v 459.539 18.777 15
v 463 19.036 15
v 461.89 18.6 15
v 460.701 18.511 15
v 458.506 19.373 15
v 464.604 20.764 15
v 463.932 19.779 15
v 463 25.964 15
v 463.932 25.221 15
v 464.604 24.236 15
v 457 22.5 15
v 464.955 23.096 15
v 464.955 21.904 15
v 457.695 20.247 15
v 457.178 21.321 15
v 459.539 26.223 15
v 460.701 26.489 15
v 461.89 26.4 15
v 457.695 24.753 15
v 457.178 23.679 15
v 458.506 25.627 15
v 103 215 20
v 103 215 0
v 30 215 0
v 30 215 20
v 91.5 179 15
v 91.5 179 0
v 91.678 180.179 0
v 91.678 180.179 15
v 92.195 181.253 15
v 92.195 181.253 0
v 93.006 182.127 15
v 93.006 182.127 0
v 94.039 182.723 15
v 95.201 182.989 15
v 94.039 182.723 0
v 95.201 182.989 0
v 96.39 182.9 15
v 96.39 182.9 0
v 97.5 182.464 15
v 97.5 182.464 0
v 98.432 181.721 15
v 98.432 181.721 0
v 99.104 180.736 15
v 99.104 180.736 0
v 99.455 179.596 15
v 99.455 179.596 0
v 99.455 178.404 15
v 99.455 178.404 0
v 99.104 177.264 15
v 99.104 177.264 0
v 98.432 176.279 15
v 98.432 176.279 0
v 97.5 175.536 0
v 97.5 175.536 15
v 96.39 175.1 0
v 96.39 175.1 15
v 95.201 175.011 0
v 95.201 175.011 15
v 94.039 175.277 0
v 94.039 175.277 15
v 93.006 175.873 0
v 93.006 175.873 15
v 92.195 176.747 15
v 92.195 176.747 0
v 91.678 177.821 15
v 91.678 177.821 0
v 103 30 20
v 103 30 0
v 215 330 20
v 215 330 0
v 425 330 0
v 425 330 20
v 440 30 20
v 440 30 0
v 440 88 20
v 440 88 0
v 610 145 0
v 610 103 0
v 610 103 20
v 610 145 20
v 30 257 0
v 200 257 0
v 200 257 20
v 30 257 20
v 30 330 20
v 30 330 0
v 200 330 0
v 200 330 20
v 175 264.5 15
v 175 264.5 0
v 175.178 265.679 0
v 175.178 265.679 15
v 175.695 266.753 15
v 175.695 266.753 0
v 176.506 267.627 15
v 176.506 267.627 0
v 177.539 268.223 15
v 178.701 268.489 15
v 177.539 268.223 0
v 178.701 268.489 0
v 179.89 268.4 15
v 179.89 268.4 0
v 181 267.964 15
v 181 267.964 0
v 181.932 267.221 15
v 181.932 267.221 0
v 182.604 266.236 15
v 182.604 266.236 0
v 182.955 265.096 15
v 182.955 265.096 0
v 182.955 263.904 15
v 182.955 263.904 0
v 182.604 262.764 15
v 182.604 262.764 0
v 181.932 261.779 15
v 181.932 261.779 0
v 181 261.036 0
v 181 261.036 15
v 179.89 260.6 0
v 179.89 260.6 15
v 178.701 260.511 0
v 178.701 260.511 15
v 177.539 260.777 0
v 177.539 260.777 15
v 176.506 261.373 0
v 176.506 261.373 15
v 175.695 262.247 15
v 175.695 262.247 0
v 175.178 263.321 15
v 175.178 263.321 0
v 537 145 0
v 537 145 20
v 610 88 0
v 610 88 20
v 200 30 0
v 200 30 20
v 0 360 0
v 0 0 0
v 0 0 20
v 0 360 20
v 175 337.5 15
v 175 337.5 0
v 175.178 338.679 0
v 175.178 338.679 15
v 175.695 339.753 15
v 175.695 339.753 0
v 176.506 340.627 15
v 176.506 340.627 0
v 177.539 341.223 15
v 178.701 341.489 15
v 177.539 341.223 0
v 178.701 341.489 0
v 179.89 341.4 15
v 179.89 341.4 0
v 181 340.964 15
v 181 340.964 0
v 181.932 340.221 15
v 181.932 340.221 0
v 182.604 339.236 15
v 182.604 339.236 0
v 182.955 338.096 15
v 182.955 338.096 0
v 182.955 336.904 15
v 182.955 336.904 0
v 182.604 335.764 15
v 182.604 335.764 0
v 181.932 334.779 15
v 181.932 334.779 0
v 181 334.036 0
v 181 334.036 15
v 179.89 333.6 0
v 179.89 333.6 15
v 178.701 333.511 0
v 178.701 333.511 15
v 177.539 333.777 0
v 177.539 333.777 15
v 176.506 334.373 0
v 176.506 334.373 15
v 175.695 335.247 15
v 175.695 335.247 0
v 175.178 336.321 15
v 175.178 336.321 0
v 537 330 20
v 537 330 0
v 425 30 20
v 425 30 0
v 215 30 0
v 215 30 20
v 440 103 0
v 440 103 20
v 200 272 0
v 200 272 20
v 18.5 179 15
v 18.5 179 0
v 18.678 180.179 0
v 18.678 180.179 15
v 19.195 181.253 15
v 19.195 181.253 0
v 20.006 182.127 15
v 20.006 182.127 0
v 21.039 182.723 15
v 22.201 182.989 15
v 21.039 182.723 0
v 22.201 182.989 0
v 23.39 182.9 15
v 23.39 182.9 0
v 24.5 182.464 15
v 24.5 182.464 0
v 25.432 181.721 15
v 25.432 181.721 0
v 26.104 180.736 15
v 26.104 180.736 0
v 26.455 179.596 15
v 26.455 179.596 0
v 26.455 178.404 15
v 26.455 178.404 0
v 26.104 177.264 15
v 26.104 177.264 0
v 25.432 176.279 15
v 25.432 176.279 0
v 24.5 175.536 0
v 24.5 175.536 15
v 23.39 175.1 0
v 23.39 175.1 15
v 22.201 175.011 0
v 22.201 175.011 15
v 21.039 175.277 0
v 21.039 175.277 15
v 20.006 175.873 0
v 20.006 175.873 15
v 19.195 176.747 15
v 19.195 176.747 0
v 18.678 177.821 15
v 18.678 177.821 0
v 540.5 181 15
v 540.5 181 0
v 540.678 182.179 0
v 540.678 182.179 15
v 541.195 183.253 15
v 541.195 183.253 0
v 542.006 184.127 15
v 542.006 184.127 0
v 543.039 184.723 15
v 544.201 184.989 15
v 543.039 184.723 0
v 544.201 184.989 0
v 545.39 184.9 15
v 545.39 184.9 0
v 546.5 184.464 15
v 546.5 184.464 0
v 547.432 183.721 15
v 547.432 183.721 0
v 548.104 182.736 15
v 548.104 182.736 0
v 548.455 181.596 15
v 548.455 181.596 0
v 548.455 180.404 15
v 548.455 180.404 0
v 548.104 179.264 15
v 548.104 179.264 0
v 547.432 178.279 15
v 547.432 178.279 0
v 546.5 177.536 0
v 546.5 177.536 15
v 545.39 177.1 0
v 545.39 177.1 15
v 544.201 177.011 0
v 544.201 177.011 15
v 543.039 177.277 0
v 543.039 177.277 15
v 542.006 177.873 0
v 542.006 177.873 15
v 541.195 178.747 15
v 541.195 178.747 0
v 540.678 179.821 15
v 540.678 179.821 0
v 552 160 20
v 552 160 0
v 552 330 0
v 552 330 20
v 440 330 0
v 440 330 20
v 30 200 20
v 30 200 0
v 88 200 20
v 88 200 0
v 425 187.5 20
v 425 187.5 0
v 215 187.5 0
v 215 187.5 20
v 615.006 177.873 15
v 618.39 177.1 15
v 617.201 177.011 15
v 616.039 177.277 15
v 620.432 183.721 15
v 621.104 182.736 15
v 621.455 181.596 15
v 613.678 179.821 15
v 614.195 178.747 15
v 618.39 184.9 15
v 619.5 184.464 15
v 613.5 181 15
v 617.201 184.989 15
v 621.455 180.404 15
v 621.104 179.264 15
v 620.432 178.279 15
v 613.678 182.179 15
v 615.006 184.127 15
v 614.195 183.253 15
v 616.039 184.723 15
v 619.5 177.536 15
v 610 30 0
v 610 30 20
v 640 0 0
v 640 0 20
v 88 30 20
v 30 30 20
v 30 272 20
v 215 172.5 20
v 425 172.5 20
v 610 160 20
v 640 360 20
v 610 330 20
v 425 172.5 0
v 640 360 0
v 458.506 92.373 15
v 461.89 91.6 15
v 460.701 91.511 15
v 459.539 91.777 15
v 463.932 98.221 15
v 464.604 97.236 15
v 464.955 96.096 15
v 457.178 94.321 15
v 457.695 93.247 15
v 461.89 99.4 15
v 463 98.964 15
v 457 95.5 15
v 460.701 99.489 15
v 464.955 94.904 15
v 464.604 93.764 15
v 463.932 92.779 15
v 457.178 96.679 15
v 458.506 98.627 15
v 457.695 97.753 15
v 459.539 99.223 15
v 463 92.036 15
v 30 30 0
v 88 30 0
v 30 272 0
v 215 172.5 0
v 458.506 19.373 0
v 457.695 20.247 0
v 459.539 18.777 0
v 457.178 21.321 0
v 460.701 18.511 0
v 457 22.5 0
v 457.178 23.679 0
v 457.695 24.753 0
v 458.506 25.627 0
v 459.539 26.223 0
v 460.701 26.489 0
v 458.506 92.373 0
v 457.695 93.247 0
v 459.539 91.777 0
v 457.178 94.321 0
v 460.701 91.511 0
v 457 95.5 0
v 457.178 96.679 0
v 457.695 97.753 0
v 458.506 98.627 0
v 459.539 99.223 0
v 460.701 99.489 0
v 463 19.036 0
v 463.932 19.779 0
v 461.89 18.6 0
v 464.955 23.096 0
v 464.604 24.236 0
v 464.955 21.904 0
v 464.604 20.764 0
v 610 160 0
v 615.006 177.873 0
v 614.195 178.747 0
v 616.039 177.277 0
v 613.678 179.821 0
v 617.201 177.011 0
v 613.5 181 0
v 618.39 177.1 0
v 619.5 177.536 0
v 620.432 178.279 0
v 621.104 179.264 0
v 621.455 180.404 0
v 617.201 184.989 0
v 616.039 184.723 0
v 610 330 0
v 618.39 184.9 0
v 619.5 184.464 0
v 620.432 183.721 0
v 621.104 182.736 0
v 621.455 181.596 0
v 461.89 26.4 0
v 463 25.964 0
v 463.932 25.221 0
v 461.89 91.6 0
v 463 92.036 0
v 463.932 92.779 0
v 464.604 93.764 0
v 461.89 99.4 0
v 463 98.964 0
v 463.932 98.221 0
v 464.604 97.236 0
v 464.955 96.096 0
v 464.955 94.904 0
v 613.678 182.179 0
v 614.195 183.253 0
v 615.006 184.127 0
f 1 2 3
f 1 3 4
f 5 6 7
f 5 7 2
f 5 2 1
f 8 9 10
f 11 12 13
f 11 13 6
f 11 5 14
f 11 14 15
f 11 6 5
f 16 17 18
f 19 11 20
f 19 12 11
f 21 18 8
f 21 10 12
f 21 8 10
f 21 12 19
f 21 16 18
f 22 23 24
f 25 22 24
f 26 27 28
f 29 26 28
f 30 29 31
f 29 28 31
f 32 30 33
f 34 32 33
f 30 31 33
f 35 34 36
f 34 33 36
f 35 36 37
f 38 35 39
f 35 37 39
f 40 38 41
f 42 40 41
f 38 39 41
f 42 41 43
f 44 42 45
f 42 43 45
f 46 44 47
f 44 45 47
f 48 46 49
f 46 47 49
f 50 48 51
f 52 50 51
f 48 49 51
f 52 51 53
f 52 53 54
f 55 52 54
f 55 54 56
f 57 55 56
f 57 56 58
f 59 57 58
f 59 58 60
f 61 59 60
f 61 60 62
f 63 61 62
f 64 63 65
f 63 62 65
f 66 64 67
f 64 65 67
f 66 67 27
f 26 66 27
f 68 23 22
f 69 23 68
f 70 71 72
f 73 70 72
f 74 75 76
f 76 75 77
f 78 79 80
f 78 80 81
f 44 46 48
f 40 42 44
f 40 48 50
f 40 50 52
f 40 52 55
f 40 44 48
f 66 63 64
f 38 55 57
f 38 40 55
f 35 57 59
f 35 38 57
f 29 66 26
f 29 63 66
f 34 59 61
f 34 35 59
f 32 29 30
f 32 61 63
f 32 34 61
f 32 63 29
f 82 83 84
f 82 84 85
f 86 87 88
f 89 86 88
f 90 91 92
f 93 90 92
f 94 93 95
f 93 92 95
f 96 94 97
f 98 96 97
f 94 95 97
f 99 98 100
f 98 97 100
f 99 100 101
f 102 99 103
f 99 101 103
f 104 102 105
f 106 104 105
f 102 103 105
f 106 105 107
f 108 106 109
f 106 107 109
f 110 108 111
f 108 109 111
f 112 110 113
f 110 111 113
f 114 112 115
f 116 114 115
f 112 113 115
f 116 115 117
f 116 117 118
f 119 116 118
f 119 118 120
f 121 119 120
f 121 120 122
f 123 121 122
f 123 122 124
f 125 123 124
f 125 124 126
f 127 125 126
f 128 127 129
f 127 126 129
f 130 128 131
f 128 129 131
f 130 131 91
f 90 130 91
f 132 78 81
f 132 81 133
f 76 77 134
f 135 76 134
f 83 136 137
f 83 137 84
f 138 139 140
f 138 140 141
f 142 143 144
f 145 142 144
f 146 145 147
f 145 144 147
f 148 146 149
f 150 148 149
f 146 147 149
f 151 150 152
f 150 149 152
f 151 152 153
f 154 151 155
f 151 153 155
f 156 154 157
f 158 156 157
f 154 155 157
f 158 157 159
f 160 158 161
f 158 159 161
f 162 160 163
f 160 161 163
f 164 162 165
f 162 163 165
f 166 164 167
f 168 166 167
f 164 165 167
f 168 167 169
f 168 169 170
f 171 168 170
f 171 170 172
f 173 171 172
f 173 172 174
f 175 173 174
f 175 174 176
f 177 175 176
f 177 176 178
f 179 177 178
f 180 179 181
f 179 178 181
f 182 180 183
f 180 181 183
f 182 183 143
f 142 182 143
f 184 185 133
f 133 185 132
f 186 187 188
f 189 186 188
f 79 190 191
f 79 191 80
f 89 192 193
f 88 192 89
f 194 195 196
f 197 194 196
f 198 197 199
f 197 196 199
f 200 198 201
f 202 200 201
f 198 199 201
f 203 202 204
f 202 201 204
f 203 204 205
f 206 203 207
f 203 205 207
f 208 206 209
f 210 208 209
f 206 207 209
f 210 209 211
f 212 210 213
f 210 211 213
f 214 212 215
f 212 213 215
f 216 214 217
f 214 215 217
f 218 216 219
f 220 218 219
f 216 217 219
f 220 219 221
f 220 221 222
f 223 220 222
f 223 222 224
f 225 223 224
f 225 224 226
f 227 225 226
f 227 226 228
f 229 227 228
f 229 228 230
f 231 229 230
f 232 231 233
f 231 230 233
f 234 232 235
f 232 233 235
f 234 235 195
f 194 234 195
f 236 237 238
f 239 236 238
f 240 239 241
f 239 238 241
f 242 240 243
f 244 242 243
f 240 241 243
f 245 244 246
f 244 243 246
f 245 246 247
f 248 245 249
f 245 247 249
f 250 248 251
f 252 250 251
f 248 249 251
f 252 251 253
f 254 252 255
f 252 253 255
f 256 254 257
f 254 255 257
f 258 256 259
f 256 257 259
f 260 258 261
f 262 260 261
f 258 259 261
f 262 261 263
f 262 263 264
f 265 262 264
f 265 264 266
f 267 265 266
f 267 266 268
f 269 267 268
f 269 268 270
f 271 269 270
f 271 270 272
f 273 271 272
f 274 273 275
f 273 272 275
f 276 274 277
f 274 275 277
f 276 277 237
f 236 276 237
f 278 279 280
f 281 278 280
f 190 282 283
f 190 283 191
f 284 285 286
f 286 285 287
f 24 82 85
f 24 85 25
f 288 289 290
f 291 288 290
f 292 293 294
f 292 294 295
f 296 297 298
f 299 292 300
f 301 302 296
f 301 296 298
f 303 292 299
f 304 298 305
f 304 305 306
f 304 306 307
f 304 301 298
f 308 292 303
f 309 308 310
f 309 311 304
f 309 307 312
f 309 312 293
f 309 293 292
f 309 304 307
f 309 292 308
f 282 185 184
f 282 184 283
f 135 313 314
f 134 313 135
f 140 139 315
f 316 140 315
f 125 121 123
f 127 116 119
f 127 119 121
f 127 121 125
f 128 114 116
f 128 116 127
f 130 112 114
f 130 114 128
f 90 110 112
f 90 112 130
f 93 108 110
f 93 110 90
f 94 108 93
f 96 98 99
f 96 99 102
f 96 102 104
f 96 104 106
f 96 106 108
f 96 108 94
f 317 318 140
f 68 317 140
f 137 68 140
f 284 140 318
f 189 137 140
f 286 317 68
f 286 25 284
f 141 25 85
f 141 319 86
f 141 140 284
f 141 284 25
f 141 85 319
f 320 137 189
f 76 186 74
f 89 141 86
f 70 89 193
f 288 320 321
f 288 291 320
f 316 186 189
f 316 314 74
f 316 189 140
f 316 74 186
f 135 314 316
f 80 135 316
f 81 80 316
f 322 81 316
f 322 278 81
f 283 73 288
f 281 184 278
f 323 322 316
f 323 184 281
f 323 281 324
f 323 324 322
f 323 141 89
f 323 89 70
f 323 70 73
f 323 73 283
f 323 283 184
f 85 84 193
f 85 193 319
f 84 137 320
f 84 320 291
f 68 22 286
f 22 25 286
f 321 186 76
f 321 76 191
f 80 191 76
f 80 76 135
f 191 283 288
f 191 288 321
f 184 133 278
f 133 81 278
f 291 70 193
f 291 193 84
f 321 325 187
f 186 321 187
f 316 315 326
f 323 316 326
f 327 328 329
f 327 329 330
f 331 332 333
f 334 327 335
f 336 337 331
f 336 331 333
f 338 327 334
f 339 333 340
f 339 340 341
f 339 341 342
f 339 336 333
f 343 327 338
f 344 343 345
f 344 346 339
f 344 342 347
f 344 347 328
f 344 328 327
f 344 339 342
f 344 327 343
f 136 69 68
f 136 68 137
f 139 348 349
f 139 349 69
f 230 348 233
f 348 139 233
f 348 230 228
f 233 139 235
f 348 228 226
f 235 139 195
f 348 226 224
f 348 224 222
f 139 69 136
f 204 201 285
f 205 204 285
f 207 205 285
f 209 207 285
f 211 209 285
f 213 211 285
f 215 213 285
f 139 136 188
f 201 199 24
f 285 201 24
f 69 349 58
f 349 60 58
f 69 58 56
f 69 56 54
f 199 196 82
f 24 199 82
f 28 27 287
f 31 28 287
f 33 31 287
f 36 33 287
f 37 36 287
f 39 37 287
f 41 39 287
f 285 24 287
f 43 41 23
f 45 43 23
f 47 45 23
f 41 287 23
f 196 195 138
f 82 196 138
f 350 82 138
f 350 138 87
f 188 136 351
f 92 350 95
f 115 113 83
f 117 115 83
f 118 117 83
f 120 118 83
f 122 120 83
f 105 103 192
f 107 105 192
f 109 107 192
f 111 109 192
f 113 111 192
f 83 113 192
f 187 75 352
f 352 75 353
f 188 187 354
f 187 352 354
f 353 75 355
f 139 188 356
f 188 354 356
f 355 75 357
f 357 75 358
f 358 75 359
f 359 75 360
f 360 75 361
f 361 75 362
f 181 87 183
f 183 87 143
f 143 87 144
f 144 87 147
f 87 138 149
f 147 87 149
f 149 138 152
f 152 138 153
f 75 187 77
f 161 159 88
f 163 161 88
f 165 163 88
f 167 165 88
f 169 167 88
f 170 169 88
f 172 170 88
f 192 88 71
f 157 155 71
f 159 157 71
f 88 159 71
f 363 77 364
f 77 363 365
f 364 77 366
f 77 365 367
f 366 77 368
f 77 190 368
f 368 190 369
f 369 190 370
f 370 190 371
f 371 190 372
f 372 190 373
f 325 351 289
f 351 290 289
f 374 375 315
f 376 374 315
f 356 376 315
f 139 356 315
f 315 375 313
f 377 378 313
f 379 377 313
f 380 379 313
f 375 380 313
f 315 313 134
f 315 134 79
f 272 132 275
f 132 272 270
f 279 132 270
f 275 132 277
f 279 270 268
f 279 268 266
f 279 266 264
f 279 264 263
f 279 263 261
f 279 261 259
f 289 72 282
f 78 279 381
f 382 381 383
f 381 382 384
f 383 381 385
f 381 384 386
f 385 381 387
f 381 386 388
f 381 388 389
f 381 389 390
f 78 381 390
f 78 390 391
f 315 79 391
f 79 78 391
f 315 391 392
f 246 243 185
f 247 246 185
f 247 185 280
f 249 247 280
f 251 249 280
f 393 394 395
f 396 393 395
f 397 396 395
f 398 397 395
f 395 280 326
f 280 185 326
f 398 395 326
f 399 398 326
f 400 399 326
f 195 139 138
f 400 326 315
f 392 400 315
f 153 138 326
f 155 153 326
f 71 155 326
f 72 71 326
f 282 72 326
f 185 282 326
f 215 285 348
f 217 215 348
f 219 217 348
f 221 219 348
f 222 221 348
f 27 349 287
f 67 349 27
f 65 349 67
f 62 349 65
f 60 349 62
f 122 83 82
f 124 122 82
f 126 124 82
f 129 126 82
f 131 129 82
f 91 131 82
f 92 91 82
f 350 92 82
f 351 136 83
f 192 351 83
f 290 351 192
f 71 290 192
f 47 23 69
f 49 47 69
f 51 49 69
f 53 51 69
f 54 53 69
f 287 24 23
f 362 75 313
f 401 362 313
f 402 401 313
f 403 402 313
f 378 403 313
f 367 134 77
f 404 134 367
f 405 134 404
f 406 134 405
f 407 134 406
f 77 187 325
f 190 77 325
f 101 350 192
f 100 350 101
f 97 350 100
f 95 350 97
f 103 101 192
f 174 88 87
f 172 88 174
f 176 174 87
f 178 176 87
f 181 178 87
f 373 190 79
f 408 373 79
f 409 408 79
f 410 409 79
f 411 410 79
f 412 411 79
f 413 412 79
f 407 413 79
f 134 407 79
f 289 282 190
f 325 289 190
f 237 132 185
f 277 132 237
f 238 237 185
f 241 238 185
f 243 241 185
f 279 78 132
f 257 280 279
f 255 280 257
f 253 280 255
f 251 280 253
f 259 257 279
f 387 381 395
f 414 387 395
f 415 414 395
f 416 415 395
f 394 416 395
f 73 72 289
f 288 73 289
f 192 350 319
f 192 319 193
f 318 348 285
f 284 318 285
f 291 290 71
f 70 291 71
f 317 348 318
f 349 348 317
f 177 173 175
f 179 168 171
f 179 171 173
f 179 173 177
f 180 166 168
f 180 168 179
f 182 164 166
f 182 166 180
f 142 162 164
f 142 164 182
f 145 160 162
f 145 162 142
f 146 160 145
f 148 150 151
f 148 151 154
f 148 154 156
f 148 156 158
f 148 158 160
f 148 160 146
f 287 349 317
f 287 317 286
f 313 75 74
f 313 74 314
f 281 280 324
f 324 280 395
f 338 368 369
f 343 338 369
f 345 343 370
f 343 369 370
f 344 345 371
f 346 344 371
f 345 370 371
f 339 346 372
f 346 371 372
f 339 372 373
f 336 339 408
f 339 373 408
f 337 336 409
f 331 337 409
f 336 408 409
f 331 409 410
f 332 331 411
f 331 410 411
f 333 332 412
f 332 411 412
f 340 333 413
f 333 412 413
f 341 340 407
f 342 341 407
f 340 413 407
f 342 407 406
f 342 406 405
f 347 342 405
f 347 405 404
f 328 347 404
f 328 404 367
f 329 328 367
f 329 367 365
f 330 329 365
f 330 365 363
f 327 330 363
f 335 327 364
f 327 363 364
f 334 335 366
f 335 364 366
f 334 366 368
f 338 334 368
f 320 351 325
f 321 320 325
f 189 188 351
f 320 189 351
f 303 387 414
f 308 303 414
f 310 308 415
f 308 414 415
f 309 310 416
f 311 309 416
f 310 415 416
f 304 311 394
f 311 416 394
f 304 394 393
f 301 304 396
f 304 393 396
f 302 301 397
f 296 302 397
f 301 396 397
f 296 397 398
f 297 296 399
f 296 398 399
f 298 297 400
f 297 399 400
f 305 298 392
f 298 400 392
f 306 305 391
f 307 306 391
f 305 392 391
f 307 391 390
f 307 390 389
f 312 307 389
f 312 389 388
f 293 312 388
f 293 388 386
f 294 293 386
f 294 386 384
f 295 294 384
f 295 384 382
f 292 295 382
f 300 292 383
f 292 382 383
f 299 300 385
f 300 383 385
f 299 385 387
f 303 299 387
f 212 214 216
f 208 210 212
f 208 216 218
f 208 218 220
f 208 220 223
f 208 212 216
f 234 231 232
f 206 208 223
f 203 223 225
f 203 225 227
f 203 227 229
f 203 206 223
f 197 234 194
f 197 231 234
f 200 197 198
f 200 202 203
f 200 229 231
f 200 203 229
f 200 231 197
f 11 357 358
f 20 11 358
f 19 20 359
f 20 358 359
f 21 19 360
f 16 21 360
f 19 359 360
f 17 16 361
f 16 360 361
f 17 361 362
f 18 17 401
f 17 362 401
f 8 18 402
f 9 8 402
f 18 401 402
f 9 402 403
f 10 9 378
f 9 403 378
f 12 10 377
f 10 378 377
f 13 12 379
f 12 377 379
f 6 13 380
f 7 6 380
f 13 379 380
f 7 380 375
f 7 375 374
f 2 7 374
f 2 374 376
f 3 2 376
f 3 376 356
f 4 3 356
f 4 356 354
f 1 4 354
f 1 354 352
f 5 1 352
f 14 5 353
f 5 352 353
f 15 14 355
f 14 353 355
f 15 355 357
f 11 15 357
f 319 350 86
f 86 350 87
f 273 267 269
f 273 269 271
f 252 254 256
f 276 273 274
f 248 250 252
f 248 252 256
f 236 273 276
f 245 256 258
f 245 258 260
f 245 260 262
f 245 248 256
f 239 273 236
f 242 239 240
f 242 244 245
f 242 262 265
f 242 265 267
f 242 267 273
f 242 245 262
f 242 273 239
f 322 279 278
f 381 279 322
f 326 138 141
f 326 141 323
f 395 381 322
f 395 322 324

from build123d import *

# Parameters (mm, degrees)
ESBO_O1_W                = 640
ESBO_O1_H                = 360
ESBO_O1_W_2              = 170
ESBO_O1_H_2              = 58
ESBO_O1_W_3              = 58
ESBO_O1_H_3              = 170
RESSALTO_EXTRUS_O1_DEPTH = 20
ESBO_O2_R                = 4
CORTE_EXTRUS_O1_DEPTH    = 15


with BuildPart() as part:
    # Esboço1 → Ressalto-extrusão1 (new body)
    with BuildSketch(Plane.XY):
        with Locations((320, 180)):
            Rectangle(ESBO_O1_W, ESBO_O1_H)
        Polygon((215, 330), (425, 330), (425, 187.5), (215, 187.5), (215, 257), align=None, mode=Mode.SUBTRACT)
        with Locations((115, 301)):
            Rectangle(ESBO_O1_W_2, ESBO_O1_H_2, mode=Mode.SUBTRACT)
        with Locations((59, 115)):
            Rectangle(ESBO_O1_W_3, ESBO_O1_H_3, mode=Mode.SUBTRACT)
        with Locations((581, 245)):
            Rectangle(ESBO_O1_W_3, ESBO_O1_H_3, mode=Mode.SUBTRACT)
        Polygon((200, 257), (30, 257), (30, 215), (88, 215), (103, 215), (103, 30), (200, 30), align=None, mode=Mode.SUBTRACT)
        Polygon((425, 88), (425, 30), (215, 30), (215, 172.5), (425, 172.5), (425, 103), align=None, mode=Mode.SUBTRACT)
        with Locations((525, 59)):
            Rectangle(ESBO_O1_W_2, ESBO_O1_H_2, mode=Mode.SUBTRACT)
        Polygon((440, 103), (610, 103), (610, 145), (537, 145), (537, 160), (537, 330), (440, 330), align=None, mode=Mode.SUBTRACT)
    extrude(amount=RESSALTO_EXTRUS_O1_DEPTH)

    # Esboço2 → Corte-extrusão1 (cut)
    with BuildSketch(Plane(origin=(0, 0, 0), x_dir=(-1, 0, 0), z_dir=(0, 0, -1))):
        with Locations((-179, 337.5)):
            Circle(ESBO_O2_R)
        with Locations((-179, 264.5)):
            Circle(ESBO_O2_R)
        with Locations((-22.5, 179)):
            Circle(ESBO_O2_R)
        with Locations((-95.5, 179)):
            Circle(ESBO_O2_R)
        with Locations((-461, 95.5)):
            Circle(ESBO_O2_R)
        with Locations((-461, 22.5)):
            Circle(ESBO_O2_R)
        with Locations((-544.5, 181)):
            Circle(ESBO_O2_R)
        with Locations((-617.5, 181)):
            Circle(ESBO_O2_R)
    extrude(amount=-CORTE_EXTRUS_O1_DEPTH, mode=Mode.SUBTRACT)


solid = part.part
